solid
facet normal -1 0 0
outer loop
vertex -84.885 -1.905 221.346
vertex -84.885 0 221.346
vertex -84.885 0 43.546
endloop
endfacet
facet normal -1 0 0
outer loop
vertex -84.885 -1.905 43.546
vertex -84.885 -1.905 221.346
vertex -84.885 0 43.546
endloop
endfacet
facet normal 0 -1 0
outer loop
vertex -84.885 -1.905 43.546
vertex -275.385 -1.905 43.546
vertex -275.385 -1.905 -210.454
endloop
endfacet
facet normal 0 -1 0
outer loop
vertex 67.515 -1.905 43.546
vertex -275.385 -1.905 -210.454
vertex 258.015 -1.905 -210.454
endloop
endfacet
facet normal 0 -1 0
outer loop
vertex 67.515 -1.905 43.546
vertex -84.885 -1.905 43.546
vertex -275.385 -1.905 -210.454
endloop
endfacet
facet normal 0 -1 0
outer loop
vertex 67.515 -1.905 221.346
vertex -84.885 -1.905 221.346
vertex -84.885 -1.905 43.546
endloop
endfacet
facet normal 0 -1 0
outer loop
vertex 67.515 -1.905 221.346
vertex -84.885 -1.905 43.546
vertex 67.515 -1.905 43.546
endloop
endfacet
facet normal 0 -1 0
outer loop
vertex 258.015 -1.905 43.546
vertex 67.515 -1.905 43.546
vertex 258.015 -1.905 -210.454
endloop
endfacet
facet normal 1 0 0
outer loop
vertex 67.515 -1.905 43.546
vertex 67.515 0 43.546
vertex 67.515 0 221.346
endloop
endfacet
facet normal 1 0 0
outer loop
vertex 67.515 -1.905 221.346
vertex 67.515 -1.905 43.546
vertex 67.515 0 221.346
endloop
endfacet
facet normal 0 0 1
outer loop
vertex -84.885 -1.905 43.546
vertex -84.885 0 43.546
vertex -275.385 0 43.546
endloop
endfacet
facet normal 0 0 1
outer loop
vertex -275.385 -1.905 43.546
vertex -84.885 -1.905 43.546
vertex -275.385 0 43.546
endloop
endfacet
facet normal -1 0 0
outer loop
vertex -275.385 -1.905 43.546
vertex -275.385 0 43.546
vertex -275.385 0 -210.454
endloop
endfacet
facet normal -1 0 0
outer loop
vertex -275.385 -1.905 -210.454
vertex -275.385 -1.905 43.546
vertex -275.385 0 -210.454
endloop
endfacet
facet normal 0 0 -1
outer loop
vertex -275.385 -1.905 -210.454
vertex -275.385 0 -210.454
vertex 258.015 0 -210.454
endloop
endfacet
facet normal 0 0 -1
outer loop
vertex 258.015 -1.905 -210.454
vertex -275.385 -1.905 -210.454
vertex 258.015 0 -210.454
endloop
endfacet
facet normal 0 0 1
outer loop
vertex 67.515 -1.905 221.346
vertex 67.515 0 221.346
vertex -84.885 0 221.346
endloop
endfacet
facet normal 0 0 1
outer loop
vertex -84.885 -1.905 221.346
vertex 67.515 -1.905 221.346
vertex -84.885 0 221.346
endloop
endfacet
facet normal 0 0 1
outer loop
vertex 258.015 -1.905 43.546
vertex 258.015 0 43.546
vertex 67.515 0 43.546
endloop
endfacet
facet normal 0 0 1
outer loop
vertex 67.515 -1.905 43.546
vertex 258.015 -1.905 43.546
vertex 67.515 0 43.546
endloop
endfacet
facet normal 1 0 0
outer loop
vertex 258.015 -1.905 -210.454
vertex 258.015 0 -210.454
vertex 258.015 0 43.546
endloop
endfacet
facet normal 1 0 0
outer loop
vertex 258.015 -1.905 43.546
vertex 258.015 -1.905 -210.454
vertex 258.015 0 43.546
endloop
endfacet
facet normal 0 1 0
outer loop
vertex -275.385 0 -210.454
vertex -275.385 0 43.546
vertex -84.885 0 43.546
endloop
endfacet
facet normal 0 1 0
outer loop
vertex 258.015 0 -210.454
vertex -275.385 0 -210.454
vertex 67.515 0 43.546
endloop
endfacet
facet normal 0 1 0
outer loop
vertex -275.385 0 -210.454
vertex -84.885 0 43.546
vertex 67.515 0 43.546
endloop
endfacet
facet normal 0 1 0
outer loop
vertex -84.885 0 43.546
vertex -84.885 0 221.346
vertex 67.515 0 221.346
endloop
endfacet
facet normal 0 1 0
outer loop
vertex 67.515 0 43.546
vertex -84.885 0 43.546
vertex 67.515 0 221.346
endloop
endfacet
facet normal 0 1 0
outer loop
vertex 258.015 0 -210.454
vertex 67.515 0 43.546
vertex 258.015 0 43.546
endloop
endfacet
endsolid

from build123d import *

# Parameters (mm, degrees)
F1_DEPTH = 1.905
F2_DEPTH = 1.905


with BuildPart() as f1:
    # F0 (on Front) → F1 (new body)
    with BuildSketch(Plane.XZ):
        Polygon((-275.385344, 43.545973), (-275.385344, -210.454027), (258.014656, -210.454027), (258.014656, 43.545973), (67.514656, 43.545973), (67.514656, 221.345973), (-84.885344, 221.345973), (-84.885344, 43.545973), align=None)
        Polygon((-82.980344, 219.440973), (65.609656, 219.440973), (65.609656, 41.640973), (256.109656, 41.640973), (256.109656, -208.549027), (-273.480344, -208.549027), (-273.480344, 41.640973), (-82.980344, 41.640973), align=None, mode=Mode.SUBTRACT)
    extrude(amount=F1_DEPTH)

    # F0 (on Front) → F2 (join)
    with BuildSketch(Plane.XZ):
        Polygon((-275.385344, 43.545973), (-275.385344, -210.454027), (258.014656, -210.454027), (258.014656, 43.545973), (67.514656, 43.545973), (67.514656, 221.345973), (-84.885344, 221.345973), (-84.885344, 43.545973), align=None)
        Polygon((-82.980344, 219.440973), (65.609656, 219.440973), (65.609656, 41.640973), (256.109656, 41.640973), (256.109656, -208.549027), (-273.480344, -208.549027), (-273.480344, 41.640973), (-82.980344, 41.640973), align=None, mode=Mode.SUBTRACT)
        Polygon((65.609656, 41.640973), (65.609656, 219.440973), (-82.980344, 219.440973), (-82.980344, 41.640973), (-273.480344, 41.640973), (-273.480344, -208.549027), (256.109656, -208.549027), (256.109656, 41.640973), align=None)
    extrude(amount=F2_DEPTH)


solid = f1.part
